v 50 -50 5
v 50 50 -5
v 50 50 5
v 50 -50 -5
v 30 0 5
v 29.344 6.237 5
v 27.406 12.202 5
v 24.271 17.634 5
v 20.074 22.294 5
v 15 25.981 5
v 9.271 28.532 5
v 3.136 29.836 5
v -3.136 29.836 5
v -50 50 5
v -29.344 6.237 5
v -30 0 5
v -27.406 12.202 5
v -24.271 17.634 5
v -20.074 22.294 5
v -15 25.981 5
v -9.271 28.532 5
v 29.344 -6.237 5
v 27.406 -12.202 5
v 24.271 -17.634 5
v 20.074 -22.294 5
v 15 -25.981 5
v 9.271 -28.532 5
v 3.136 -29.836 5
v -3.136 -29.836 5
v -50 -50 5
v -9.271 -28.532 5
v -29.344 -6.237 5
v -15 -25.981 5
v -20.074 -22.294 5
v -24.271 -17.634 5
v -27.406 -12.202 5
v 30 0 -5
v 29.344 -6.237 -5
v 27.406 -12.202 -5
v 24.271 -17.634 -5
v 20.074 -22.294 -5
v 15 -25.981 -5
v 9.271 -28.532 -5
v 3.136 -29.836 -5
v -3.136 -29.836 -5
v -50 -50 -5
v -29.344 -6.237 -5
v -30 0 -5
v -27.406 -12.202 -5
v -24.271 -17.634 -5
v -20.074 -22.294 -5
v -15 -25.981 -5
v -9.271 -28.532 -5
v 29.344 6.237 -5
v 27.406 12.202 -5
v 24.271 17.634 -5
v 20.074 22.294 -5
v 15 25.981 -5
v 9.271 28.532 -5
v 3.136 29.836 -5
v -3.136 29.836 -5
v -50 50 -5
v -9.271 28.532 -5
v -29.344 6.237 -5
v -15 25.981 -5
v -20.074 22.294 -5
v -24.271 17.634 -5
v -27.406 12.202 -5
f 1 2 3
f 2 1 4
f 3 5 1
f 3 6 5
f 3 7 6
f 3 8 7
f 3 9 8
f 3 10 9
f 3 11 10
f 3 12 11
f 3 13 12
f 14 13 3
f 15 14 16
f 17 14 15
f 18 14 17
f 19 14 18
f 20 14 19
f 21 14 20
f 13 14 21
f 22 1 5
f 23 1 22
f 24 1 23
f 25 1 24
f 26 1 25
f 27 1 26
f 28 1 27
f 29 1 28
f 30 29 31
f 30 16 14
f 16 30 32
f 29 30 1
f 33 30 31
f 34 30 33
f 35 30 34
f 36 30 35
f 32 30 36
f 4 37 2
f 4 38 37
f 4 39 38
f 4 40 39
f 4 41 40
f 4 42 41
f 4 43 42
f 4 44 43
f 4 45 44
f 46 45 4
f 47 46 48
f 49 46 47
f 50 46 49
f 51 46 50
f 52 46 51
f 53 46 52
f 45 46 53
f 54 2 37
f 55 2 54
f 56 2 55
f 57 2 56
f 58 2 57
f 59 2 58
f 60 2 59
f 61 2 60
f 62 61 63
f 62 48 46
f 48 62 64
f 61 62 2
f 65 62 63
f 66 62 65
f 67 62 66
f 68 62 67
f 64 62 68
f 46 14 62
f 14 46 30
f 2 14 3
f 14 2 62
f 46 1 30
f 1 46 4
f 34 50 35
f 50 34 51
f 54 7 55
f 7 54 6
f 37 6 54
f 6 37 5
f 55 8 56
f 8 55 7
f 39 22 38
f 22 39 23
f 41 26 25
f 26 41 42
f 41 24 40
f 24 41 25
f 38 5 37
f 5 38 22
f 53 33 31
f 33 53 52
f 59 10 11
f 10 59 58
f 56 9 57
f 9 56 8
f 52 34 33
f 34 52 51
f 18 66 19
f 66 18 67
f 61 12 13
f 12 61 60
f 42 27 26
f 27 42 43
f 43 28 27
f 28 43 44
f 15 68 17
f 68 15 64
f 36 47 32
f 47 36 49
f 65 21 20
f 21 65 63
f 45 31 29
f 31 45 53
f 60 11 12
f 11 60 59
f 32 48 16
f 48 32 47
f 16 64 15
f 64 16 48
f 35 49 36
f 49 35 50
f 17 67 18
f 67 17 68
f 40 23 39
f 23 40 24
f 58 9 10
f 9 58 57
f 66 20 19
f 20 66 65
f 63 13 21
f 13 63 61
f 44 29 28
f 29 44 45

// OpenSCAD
width = 100;
hole = 30;

difference(){
cube([width,width,10], center=true);
cylinder(h=11, r1 = hole, r2 = hole, center=true);
}
